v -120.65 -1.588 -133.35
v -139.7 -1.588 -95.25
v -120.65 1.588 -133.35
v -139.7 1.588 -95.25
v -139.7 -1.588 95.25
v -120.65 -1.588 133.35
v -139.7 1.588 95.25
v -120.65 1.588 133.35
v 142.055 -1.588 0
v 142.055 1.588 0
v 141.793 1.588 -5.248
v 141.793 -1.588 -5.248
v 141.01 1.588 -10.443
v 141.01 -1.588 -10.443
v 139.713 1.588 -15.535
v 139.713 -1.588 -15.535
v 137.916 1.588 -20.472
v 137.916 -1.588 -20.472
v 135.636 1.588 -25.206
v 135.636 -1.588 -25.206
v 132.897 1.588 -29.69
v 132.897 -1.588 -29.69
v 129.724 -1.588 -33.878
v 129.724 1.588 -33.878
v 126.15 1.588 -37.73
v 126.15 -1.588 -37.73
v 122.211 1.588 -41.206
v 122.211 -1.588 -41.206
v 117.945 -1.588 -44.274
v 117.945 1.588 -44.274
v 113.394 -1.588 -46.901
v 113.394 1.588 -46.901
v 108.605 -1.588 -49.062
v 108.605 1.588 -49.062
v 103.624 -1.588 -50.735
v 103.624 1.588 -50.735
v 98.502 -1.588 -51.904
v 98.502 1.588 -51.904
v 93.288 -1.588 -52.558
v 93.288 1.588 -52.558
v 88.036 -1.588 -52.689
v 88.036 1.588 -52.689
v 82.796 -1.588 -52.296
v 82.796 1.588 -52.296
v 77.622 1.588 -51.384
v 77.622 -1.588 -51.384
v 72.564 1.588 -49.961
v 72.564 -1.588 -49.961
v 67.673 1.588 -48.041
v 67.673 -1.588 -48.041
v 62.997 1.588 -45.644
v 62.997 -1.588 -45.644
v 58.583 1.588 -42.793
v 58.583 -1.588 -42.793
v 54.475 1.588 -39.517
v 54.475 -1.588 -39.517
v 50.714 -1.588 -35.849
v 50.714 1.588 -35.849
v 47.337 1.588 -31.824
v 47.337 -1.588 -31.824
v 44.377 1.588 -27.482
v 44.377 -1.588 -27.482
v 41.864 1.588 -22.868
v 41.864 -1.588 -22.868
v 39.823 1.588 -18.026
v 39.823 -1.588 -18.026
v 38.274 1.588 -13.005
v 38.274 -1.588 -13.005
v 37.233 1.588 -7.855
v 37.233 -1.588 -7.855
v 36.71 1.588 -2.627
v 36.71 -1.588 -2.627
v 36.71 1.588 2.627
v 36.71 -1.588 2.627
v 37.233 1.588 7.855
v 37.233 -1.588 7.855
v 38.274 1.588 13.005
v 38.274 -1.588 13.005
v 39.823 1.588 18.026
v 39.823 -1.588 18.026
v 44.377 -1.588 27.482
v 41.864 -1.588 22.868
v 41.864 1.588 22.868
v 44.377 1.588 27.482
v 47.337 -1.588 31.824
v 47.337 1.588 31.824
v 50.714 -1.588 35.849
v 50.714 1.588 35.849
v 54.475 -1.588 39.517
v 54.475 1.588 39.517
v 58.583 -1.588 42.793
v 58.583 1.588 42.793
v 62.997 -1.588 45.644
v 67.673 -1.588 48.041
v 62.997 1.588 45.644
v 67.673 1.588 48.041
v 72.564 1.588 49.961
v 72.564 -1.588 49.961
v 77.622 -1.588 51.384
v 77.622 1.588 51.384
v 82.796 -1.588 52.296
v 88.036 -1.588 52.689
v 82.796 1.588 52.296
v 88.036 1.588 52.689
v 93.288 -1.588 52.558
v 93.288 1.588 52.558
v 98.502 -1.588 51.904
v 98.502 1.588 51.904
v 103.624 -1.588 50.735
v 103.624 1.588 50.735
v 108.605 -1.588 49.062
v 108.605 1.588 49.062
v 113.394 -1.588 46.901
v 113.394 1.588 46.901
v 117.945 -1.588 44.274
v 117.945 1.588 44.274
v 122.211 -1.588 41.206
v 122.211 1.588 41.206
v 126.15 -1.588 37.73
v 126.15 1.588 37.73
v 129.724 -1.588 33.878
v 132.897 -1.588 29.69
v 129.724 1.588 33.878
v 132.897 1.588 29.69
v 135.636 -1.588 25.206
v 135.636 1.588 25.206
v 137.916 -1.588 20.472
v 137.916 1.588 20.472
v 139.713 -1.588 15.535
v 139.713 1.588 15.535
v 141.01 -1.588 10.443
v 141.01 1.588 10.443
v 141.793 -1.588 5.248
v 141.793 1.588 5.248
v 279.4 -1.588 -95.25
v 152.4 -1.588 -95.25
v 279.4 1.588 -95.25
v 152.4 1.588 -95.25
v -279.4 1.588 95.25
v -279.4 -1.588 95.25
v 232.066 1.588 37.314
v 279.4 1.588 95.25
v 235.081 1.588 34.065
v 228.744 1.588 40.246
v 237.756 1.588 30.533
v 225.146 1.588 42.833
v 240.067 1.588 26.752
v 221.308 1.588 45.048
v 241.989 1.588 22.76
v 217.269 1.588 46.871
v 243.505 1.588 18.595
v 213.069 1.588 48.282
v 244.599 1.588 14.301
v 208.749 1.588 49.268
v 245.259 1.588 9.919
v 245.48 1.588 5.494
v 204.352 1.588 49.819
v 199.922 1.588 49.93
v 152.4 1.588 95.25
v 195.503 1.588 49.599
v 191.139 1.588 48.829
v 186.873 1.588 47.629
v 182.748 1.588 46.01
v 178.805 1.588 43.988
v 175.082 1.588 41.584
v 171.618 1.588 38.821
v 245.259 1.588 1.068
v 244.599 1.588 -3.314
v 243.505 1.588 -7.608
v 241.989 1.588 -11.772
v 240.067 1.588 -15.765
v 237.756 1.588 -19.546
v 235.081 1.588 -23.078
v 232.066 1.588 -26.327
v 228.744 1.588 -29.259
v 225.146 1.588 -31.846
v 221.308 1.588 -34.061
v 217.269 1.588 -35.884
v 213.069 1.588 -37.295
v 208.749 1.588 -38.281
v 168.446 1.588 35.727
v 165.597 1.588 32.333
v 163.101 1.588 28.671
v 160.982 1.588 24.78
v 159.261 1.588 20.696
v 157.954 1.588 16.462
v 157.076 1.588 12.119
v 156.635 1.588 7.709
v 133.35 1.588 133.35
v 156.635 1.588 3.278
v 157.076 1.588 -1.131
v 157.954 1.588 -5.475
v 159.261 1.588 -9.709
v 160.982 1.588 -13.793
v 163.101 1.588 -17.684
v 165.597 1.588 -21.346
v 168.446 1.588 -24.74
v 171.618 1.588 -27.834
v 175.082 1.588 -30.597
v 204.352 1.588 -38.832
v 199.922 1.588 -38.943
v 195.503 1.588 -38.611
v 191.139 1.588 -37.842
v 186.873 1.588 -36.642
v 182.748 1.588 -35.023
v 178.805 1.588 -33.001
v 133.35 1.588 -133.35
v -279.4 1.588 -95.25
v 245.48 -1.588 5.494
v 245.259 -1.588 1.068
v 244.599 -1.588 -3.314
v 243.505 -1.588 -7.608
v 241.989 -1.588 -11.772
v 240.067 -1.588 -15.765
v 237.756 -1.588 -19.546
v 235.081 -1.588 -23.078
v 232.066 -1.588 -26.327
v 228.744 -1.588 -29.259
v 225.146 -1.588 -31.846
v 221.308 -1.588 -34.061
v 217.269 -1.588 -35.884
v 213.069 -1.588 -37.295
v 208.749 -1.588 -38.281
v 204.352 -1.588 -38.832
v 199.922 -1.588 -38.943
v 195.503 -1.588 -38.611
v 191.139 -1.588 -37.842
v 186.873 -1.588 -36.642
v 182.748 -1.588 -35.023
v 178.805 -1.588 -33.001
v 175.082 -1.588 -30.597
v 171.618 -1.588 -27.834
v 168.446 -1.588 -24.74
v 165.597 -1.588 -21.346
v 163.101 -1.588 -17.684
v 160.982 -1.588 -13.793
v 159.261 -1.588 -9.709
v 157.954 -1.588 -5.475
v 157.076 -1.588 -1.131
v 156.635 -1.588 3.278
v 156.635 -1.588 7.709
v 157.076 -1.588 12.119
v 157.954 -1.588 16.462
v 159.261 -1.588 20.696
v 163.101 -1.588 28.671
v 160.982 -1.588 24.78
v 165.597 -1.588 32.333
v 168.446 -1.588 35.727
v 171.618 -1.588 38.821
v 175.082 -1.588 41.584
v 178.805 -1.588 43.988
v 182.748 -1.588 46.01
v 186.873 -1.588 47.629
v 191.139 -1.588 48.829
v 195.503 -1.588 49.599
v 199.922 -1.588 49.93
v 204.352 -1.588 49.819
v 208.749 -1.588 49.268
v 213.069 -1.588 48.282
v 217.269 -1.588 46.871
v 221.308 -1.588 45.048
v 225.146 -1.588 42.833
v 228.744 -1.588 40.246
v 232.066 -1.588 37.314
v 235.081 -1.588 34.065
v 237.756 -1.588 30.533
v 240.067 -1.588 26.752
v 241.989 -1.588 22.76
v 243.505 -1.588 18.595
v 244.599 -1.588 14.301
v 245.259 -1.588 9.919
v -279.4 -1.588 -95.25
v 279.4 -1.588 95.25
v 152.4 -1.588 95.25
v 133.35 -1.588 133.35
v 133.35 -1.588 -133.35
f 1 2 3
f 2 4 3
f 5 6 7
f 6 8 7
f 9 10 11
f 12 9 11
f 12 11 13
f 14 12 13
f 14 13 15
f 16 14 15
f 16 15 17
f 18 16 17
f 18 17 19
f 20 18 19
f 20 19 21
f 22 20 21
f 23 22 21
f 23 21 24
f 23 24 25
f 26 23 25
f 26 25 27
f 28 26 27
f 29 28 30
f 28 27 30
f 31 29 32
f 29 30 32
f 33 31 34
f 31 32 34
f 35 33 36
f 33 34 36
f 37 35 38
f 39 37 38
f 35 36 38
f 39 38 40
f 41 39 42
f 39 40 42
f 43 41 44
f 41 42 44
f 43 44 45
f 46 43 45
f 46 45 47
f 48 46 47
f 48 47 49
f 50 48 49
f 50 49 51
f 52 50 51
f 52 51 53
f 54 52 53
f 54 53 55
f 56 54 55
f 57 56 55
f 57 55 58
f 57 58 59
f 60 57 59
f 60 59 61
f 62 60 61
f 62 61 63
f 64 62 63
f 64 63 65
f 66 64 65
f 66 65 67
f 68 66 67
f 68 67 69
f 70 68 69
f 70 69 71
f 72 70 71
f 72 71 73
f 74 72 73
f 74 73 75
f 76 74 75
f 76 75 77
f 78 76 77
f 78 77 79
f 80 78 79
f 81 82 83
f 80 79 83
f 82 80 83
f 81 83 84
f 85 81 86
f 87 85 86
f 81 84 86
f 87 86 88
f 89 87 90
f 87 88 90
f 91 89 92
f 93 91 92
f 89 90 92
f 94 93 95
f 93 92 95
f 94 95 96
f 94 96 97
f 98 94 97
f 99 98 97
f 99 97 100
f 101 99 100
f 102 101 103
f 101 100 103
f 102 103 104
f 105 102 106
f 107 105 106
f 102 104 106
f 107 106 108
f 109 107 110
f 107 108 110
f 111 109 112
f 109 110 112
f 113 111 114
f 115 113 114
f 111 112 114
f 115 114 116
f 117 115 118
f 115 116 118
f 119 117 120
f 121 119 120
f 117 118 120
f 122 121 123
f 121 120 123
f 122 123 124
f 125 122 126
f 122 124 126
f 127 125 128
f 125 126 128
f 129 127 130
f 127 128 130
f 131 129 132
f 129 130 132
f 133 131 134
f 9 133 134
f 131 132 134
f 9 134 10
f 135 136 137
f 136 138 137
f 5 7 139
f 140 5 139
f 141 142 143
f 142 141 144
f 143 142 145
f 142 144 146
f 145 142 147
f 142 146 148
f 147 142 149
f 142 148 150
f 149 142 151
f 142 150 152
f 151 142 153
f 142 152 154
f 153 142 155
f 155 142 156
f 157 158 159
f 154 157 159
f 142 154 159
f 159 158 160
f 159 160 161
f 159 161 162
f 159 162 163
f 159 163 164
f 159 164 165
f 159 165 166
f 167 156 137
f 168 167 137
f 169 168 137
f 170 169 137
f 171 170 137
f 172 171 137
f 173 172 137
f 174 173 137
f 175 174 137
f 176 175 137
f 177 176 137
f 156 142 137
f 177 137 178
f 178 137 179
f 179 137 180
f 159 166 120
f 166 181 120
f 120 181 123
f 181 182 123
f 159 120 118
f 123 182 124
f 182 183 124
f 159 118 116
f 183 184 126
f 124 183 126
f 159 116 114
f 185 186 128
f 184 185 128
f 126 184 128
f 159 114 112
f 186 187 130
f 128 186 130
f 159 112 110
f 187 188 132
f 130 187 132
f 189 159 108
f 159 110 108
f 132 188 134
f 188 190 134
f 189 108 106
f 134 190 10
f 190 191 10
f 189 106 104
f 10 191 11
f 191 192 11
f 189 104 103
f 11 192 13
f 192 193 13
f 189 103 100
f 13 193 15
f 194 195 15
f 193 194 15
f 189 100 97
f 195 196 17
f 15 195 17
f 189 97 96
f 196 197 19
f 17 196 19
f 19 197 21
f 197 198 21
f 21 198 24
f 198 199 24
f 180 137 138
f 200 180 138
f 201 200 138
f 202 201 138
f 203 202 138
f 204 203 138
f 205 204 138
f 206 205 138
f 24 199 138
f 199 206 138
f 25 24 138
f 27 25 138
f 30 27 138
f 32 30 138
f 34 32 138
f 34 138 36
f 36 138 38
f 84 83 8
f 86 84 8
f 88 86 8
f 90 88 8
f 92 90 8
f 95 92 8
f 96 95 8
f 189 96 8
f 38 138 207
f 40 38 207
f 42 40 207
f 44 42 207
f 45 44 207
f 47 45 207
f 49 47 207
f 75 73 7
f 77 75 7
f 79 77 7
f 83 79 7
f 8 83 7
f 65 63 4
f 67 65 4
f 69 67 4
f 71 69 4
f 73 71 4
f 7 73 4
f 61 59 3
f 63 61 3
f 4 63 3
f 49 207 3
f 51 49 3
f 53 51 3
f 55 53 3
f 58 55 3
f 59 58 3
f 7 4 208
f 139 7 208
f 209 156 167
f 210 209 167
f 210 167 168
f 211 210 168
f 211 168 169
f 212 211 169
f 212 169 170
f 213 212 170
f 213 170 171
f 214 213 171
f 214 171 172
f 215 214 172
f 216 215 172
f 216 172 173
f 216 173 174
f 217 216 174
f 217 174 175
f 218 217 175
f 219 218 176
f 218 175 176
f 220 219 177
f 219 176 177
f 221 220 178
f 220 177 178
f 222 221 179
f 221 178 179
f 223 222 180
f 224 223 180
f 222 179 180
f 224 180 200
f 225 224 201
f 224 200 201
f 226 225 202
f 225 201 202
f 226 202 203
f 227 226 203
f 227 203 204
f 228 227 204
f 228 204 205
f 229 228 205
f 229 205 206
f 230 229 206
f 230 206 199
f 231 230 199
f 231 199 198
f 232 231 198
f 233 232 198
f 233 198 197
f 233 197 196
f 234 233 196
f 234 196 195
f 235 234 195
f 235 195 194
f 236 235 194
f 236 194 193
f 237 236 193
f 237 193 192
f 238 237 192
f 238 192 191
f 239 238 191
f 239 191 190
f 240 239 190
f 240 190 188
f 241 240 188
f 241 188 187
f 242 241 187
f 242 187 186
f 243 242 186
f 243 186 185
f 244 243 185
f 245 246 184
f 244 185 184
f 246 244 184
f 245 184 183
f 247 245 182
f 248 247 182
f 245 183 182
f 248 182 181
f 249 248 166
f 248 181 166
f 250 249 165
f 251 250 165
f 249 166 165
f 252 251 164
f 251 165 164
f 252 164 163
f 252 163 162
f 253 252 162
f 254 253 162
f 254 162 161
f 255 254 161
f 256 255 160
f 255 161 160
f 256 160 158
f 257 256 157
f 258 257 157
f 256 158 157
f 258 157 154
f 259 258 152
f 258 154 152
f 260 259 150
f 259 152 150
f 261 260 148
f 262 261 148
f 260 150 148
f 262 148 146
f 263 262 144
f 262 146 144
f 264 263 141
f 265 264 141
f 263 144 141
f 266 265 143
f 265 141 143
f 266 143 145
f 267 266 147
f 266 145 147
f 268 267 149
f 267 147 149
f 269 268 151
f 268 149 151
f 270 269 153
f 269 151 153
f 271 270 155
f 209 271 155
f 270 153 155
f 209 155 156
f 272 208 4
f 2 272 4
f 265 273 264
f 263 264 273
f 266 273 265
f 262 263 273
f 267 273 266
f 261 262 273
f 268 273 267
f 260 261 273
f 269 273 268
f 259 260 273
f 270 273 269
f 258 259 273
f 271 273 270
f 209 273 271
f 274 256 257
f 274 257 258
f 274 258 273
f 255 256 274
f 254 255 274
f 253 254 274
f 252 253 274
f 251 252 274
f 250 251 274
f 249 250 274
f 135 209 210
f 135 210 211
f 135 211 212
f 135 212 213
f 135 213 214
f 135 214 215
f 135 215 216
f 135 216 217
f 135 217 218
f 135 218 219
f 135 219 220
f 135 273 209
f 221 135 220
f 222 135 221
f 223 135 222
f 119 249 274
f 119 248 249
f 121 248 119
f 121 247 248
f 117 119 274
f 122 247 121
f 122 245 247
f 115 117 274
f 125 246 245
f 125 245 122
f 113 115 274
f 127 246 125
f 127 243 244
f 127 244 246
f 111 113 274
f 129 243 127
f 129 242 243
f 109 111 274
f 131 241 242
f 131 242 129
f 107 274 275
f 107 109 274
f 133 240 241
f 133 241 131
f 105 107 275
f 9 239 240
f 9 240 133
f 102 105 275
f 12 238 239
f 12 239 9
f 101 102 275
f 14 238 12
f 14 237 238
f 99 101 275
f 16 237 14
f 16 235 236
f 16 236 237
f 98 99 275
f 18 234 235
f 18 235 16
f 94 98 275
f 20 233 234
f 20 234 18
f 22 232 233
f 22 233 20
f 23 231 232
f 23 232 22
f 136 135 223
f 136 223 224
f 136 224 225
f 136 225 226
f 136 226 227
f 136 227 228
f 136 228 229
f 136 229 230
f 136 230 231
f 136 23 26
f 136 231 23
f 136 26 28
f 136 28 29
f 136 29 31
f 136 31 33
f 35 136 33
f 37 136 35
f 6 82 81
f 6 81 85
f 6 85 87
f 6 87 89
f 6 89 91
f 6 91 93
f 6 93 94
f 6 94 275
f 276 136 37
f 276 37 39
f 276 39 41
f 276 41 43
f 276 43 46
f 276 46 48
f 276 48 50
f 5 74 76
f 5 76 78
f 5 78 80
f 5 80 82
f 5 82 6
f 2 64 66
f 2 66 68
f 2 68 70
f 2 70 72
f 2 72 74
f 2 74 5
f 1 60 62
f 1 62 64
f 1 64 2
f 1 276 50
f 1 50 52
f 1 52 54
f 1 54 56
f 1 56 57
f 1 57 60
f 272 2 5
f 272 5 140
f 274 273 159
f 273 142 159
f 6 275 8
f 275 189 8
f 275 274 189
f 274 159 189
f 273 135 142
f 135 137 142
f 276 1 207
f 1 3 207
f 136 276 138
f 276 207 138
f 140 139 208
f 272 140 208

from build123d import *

# Parameters (mm, degrees)
BOSS_EXTRUDE1_DEPTH = 1.5875
SKETCH7_R           = 52.705
SKETCH7_R_2         = 44.45
CUT_EXTRUDE1_DEPTH  = 20.32


with BuildPart() as part:
    # Sketch3 → Boss-Extrude1 (new body, symmetric)
    with BuildSketch(Plane(origin=(0, 0, 0), x_dir=(1, 0, 0), z_dir=(0, 1, 0))):
        Polygon((-279.4, 95.25), (-139.7, 95.25), (-120.65, 133.35), (133.35, 133.35), (152.4, 95.25), (279.4, 95.25), (279.4, -95.25), (152.4, -95.25), (133.35, -133.35), (-120.65, -133.35), (-139.7, -95.25), (-279.4, -95.25), align=None)
    extrude(amount=BOSS_EXTRUDE1_DEPTH, both=True)

    # Sketch7 → Cut-Extrude1 (cut)
    with BuildSketch(Plane(origin=(0, 1.5875, 0), x_dir=(1, 0, 0), z_dir=(0, 1, 0))):
        with Locations((89.349601684, 0)):
            Circle(SKETCH7_R)
        with Locations((201.029841253, -5.49358251)):
            Circle(SKETCH7_R_2)
    extrude(amount=-CUT_EXTRUDE1_DEPTH, mode=Mode.SUBTRACT)


solid = part.part
